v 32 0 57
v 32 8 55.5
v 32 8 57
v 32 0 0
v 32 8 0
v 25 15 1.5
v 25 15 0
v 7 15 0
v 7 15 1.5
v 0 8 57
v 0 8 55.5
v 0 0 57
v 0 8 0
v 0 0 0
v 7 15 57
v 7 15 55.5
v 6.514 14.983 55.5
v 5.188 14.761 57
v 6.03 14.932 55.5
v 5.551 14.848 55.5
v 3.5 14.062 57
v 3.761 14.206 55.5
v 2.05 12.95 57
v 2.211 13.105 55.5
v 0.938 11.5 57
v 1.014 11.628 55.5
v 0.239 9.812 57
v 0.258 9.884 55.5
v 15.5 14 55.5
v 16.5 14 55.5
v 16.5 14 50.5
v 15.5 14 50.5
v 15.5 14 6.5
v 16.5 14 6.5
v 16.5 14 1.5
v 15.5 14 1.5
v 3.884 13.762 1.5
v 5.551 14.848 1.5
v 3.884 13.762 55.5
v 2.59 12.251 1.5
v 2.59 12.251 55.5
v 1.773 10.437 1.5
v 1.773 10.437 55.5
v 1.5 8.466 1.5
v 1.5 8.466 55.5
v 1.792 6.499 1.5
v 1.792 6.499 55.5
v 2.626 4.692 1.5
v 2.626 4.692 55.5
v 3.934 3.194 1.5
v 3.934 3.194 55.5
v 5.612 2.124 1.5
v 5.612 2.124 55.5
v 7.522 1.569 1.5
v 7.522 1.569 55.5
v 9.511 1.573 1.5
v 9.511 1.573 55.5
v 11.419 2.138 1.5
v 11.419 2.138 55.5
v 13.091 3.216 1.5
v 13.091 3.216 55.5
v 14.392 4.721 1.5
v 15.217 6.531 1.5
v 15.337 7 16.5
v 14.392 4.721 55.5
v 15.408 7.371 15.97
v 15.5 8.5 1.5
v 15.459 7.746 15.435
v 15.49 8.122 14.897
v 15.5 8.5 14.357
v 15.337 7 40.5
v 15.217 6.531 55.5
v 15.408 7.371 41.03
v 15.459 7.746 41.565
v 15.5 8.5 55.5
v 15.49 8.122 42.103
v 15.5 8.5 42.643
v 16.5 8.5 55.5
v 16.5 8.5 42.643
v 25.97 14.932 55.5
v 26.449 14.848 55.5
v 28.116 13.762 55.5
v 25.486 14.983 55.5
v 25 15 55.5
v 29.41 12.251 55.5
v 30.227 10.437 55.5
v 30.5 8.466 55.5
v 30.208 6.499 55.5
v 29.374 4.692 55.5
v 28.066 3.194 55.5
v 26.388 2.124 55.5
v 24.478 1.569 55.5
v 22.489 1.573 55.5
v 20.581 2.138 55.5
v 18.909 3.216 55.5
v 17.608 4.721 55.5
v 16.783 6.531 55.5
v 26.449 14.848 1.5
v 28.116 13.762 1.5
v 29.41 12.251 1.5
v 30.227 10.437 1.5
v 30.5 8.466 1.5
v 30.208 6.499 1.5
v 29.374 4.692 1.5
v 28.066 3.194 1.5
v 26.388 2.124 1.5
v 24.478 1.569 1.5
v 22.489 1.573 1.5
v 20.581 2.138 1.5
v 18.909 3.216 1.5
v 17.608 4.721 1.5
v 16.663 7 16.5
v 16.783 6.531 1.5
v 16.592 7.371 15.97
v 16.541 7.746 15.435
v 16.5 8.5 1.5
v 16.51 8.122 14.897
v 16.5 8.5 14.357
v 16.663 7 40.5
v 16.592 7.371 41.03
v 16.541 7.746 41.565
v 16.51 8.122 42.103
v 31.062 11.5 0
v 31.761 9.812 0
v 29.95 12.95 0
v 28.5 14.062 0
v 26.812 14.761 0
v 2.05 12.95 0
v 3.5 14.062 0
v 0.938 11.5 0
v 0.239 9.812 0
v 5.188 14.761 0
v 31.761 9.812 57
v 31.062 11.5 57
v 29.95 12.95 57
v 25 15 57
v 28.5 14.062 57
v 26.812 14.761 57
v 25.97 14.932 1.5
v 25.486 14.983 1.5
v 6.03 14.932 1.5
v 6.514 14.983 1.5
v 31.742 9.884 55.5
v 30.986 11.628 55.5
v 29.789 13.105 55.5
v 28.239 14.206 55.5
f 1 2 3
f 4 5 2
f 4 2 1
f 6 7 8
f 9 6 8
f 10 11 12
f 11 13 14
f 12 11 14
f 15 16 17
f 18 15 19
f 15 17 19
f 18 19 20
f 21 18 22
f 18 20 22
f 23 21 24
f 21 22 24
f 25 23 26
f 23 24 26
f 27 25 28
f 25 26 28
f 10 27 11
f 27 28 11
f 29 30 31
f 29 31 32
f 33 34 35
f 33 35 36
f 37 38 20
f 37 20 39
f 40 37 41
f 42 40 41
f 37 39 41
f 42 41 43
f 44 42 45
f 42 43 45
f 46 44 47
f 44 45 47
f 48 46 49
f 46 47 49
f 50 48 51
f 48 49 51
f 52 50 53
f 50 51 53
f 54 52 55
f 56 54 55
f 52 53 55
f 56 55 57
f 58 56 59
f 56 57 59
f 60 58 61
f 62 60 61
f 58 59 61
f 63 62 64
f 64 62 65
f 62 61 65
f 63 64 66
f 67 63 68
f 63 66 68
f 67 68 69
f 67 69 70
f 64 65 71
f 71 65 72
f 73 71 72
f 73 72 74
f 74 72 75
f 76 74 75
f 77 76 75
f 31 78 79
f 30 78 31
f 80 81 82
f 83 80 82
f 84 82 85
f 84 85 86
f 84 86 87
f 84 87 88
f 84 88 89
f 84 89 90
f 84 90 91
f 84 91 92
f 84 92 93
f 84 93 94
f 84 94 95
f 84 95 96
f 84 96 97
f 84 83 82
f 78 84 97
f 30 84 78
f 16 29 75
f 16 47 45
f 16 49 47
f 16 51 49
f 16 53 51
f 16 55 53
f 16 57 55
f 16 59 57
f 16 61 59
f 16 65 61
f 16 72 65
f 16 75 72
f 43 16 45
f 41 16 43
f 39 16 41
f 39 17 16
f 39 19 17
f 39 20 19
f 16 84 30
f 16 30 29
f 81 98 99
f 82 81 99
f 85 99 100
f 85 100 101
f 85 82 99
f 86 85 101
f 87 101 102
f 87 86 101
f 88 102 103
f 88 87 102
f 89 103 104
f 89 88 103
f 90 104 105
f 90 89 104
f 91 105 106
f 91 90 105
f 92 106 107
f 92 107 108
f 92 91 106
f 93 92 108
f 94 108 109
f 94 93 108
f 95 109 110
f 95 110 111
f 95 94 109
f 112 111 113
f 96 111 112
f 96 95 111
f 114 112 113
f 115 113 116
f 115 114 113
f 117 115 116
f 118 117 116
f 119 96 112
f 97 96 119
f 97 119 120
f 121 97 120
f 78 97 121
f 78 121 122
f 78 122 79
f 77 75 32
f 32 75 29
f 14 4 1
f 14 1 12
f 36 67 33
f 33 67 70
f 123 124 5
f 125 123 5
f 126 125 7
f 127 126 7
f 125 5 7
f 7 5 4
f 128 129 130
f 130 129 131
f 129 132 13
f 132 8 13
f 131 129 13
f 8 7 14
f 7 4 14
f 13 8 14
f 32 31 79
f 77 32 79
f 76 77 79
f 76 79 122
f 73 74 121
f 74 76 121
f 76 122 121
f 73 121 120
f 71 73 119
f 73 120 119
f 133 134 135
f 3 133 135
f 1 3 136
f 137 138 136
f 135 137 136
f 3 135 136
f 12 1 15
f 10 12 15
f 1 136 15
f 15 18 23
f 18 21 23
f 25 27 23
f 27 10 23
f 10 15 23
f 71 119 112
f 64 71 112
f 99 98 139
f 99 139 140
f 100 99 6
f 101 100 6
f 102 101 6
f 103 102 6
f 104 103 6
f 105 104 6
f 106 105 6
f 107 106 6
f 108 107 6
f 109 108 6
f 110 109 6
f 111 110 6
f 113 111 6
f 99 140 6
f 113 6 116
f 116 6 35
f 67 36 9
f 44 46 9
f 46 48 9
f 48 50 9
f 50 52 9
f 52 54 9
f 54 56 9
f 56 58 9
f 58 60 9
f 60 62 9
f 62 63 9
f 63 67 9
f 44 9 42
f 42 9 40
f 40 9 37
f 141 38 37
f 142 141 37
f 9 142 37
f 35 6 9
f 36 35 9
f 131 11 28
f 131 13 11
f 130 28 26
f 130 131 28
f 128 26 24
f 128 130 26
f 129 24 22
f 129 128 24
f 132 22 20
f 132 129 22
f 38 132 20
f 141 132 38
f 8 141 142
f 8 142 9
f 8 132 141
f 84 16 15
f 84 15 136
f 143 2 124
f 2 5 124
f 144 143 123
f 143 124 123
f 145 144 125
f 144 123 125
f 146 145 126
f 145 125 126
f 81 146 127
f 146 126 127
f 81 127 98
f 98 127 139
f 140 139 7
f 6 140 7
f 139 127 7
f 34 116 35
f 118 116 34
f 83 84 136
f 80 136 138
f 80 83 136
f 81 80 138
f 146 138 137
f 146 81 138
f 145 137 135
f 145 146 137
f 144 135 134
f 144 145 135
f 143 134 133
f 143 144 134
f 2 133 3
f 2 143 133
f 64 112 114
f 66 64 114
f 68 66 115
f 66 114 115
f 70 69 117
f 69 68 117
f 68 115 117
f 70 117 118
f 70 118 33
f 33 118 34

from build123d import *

# Parameters (mm, degrees)
SKETCH1_W           = 47
SKETCH1_H           = 55.5
BOSS_EXTRUDE1_DEPTH = 15
CUT_EXTRUDE4_DEPTH  = 54
FILLET1_R           = 7
FILLET2_R           = 7
SKETCH3_W           = 4.401923789
SKETCH3_H           = 6.5
CUT_EXTRUDE5_DEPTH  = 54
SKETCH4_W           = 1
SKETCH4_H           = 1
CUT_EXTRUDE6_DEPTH  = 54
CUT_EXTRUDE7_DEPTH  = 20
CUT_EXTRUDE8_DEPTH  = 5
BOSS_EXTRUDE3_DEPTH = 1.5
CUT_EXTRUDE9_DEPTH  = 57


with BuildPart() as part:
    # Sketch1 → Boss-Extrude1 (new body)
    with BuildSketch(Plane(origin=(0, 0, 0), x_dir=(1, 0, 0), z_dir=(0, 1, 0))):
        with Locations((23.5, -27.75)):
            Rectangle(SKETCH1_W, SKETCH1_H)
    extrude(amount=BOSS_EXTRUDE1_DEPTH)

    # Sketch2 → Cut-Extrude4 (cut)
    with BuildSketch(Plane.XY.offset(55.5)):
        with BuildLine():
            Line((11.098076211, 15), (5.901923789, 15))
            ThreePointArc((5.901923789, 15), (8.5, 1.5), (11.098076211, 15))
        make_face()
        with BuildLine():
            Line((26.098076211, 15), (20.901923789, 15))
            ThreePointArc((20.901923789, 15), (23.5, 1.5), (26.098076211, 15))
        make_face()
        with BuildLine():
            ThreePointArc((35.901923789, 15), (38.5, 1.5), (41.098076211, 15))
            Line((41.098076211, 15), (35.901923789, 15))
        make_face()
    extrude(amount=-CUT_EXTRUDE4_DEPTH, mode=Mode.SUBTRACT)

    # Fillet1
    fillet1_edges = [part.edges().sort_by_distance(p)[0] for p in [
        (47, 15, 27.75),
    ]]
    fillet(fillet1_edges, radius=FILLET1_R)

    # Fillet2
    fillet2_edges = [part.edges().sort_by_distance(p)[0] for p in [
        (0, 15, 27.75),
    ]]
    fillet(fillet2_edges, radius=FILLET2_R)

    # Sketch3 → Cut-Extrude5 (cut)
    with BuildSketch(Plane.XY.offset(55.5)):
        with Locations((28.299038106, 11.75)):
            Rectangle(SKETCH3_W, SKETCH3_H)
        with Locations((33.700961895, 11.75)):
            Rectangle(SKETCH3_W, SKETCH3_H)
        with Locations((13.299038106, 11.75)):
            Rectangle(SKETCH3_W, SKETCH3_H)
        with Locations((18.700961895, 11.75)):
            Rectangle(SKETCH3_W, SKETCH3_H)
    extrude(amount=-CUT_EXTRUDE5_DEPTH, mode=Mode.SUBTRACT)

    # Sketch4 → Cut-Extrude6 (cut)
    with BuildSketch(Plane.XY.offset(55.5)):
        with Locations((16, 14.5)):
            Rectangle(SKETCH4_W, SKETCH4_H)
        with Locations((31, 14.5)):
            Rectangle(SKETCH4_W, SKETCH4_H)
    extrude(amount=-CUT_EXTRUDE6_DEPTH, mode=Mode.SUBTRACT)

    # Sketch5 → Cut-Extrude7 (cut)
    with BuildSketch(Plane.ZY.offset(-15.5)):
        Polygon((6.5, 14), (50.5, 14), (40.5, 7), (16.5, 7), align=None)
    extrude(amount=-CUT_EXTRUDE7_DEPTH, mode=Mode.SUBTRACT)

    # Sketch5<2> → Cut-Extrude8 (cut)
    with BuildSketch(Plane.ZY.offset(-15.5)):
        Polygon((6.5, 14), (50.5, 14), (40.5, 7), (16.5, 7), align=None)
    extrude(amount=CUT_EXTRUDE8_DEPTH, mode=Mode.SUBTRACT)

    # Sketch6 → Boss-Extrude3 (add)
    with BuildSketch(Plane.XY.offset(55.5)):
        with BuildLine():
            Line((0, 0), (47, 0))
            Line((47, 0), (47, 8))
            ThreePointArc((47, 8), (44.949747468, 12.949747468), (40, 15))
            Line((40, 15), (7, 15))
            ThreePointArc((7, 15), (2.050252532, 12.949747468), (0, 8))
            Line((0, 8), (0, 0))
        make_face()
    extrude(amount=BOSS_EXTRUDE3_DEPTH)

    # Sketch7 → Cut-Extrude9 (cut)
    with BuildSketch(Plane.XY.offset(57)):
        Polygon((16, 8), (16, 15), (47, 15), (47, 0), (16, 0), align=None)
    extrude(amount=-CUT_EXTRUDE9_DEPTH, mode=Mode.SUBTRACT)

    # Mirror1: part across plane


with BuildPart() as part_1:
    add(part.part)
    add(part.part.mirror(Plane(origin=(16, 8, 0), x_dir=(0, 0, 1), z_dir=(-1, 0, 0))))


solid = part_1.part
